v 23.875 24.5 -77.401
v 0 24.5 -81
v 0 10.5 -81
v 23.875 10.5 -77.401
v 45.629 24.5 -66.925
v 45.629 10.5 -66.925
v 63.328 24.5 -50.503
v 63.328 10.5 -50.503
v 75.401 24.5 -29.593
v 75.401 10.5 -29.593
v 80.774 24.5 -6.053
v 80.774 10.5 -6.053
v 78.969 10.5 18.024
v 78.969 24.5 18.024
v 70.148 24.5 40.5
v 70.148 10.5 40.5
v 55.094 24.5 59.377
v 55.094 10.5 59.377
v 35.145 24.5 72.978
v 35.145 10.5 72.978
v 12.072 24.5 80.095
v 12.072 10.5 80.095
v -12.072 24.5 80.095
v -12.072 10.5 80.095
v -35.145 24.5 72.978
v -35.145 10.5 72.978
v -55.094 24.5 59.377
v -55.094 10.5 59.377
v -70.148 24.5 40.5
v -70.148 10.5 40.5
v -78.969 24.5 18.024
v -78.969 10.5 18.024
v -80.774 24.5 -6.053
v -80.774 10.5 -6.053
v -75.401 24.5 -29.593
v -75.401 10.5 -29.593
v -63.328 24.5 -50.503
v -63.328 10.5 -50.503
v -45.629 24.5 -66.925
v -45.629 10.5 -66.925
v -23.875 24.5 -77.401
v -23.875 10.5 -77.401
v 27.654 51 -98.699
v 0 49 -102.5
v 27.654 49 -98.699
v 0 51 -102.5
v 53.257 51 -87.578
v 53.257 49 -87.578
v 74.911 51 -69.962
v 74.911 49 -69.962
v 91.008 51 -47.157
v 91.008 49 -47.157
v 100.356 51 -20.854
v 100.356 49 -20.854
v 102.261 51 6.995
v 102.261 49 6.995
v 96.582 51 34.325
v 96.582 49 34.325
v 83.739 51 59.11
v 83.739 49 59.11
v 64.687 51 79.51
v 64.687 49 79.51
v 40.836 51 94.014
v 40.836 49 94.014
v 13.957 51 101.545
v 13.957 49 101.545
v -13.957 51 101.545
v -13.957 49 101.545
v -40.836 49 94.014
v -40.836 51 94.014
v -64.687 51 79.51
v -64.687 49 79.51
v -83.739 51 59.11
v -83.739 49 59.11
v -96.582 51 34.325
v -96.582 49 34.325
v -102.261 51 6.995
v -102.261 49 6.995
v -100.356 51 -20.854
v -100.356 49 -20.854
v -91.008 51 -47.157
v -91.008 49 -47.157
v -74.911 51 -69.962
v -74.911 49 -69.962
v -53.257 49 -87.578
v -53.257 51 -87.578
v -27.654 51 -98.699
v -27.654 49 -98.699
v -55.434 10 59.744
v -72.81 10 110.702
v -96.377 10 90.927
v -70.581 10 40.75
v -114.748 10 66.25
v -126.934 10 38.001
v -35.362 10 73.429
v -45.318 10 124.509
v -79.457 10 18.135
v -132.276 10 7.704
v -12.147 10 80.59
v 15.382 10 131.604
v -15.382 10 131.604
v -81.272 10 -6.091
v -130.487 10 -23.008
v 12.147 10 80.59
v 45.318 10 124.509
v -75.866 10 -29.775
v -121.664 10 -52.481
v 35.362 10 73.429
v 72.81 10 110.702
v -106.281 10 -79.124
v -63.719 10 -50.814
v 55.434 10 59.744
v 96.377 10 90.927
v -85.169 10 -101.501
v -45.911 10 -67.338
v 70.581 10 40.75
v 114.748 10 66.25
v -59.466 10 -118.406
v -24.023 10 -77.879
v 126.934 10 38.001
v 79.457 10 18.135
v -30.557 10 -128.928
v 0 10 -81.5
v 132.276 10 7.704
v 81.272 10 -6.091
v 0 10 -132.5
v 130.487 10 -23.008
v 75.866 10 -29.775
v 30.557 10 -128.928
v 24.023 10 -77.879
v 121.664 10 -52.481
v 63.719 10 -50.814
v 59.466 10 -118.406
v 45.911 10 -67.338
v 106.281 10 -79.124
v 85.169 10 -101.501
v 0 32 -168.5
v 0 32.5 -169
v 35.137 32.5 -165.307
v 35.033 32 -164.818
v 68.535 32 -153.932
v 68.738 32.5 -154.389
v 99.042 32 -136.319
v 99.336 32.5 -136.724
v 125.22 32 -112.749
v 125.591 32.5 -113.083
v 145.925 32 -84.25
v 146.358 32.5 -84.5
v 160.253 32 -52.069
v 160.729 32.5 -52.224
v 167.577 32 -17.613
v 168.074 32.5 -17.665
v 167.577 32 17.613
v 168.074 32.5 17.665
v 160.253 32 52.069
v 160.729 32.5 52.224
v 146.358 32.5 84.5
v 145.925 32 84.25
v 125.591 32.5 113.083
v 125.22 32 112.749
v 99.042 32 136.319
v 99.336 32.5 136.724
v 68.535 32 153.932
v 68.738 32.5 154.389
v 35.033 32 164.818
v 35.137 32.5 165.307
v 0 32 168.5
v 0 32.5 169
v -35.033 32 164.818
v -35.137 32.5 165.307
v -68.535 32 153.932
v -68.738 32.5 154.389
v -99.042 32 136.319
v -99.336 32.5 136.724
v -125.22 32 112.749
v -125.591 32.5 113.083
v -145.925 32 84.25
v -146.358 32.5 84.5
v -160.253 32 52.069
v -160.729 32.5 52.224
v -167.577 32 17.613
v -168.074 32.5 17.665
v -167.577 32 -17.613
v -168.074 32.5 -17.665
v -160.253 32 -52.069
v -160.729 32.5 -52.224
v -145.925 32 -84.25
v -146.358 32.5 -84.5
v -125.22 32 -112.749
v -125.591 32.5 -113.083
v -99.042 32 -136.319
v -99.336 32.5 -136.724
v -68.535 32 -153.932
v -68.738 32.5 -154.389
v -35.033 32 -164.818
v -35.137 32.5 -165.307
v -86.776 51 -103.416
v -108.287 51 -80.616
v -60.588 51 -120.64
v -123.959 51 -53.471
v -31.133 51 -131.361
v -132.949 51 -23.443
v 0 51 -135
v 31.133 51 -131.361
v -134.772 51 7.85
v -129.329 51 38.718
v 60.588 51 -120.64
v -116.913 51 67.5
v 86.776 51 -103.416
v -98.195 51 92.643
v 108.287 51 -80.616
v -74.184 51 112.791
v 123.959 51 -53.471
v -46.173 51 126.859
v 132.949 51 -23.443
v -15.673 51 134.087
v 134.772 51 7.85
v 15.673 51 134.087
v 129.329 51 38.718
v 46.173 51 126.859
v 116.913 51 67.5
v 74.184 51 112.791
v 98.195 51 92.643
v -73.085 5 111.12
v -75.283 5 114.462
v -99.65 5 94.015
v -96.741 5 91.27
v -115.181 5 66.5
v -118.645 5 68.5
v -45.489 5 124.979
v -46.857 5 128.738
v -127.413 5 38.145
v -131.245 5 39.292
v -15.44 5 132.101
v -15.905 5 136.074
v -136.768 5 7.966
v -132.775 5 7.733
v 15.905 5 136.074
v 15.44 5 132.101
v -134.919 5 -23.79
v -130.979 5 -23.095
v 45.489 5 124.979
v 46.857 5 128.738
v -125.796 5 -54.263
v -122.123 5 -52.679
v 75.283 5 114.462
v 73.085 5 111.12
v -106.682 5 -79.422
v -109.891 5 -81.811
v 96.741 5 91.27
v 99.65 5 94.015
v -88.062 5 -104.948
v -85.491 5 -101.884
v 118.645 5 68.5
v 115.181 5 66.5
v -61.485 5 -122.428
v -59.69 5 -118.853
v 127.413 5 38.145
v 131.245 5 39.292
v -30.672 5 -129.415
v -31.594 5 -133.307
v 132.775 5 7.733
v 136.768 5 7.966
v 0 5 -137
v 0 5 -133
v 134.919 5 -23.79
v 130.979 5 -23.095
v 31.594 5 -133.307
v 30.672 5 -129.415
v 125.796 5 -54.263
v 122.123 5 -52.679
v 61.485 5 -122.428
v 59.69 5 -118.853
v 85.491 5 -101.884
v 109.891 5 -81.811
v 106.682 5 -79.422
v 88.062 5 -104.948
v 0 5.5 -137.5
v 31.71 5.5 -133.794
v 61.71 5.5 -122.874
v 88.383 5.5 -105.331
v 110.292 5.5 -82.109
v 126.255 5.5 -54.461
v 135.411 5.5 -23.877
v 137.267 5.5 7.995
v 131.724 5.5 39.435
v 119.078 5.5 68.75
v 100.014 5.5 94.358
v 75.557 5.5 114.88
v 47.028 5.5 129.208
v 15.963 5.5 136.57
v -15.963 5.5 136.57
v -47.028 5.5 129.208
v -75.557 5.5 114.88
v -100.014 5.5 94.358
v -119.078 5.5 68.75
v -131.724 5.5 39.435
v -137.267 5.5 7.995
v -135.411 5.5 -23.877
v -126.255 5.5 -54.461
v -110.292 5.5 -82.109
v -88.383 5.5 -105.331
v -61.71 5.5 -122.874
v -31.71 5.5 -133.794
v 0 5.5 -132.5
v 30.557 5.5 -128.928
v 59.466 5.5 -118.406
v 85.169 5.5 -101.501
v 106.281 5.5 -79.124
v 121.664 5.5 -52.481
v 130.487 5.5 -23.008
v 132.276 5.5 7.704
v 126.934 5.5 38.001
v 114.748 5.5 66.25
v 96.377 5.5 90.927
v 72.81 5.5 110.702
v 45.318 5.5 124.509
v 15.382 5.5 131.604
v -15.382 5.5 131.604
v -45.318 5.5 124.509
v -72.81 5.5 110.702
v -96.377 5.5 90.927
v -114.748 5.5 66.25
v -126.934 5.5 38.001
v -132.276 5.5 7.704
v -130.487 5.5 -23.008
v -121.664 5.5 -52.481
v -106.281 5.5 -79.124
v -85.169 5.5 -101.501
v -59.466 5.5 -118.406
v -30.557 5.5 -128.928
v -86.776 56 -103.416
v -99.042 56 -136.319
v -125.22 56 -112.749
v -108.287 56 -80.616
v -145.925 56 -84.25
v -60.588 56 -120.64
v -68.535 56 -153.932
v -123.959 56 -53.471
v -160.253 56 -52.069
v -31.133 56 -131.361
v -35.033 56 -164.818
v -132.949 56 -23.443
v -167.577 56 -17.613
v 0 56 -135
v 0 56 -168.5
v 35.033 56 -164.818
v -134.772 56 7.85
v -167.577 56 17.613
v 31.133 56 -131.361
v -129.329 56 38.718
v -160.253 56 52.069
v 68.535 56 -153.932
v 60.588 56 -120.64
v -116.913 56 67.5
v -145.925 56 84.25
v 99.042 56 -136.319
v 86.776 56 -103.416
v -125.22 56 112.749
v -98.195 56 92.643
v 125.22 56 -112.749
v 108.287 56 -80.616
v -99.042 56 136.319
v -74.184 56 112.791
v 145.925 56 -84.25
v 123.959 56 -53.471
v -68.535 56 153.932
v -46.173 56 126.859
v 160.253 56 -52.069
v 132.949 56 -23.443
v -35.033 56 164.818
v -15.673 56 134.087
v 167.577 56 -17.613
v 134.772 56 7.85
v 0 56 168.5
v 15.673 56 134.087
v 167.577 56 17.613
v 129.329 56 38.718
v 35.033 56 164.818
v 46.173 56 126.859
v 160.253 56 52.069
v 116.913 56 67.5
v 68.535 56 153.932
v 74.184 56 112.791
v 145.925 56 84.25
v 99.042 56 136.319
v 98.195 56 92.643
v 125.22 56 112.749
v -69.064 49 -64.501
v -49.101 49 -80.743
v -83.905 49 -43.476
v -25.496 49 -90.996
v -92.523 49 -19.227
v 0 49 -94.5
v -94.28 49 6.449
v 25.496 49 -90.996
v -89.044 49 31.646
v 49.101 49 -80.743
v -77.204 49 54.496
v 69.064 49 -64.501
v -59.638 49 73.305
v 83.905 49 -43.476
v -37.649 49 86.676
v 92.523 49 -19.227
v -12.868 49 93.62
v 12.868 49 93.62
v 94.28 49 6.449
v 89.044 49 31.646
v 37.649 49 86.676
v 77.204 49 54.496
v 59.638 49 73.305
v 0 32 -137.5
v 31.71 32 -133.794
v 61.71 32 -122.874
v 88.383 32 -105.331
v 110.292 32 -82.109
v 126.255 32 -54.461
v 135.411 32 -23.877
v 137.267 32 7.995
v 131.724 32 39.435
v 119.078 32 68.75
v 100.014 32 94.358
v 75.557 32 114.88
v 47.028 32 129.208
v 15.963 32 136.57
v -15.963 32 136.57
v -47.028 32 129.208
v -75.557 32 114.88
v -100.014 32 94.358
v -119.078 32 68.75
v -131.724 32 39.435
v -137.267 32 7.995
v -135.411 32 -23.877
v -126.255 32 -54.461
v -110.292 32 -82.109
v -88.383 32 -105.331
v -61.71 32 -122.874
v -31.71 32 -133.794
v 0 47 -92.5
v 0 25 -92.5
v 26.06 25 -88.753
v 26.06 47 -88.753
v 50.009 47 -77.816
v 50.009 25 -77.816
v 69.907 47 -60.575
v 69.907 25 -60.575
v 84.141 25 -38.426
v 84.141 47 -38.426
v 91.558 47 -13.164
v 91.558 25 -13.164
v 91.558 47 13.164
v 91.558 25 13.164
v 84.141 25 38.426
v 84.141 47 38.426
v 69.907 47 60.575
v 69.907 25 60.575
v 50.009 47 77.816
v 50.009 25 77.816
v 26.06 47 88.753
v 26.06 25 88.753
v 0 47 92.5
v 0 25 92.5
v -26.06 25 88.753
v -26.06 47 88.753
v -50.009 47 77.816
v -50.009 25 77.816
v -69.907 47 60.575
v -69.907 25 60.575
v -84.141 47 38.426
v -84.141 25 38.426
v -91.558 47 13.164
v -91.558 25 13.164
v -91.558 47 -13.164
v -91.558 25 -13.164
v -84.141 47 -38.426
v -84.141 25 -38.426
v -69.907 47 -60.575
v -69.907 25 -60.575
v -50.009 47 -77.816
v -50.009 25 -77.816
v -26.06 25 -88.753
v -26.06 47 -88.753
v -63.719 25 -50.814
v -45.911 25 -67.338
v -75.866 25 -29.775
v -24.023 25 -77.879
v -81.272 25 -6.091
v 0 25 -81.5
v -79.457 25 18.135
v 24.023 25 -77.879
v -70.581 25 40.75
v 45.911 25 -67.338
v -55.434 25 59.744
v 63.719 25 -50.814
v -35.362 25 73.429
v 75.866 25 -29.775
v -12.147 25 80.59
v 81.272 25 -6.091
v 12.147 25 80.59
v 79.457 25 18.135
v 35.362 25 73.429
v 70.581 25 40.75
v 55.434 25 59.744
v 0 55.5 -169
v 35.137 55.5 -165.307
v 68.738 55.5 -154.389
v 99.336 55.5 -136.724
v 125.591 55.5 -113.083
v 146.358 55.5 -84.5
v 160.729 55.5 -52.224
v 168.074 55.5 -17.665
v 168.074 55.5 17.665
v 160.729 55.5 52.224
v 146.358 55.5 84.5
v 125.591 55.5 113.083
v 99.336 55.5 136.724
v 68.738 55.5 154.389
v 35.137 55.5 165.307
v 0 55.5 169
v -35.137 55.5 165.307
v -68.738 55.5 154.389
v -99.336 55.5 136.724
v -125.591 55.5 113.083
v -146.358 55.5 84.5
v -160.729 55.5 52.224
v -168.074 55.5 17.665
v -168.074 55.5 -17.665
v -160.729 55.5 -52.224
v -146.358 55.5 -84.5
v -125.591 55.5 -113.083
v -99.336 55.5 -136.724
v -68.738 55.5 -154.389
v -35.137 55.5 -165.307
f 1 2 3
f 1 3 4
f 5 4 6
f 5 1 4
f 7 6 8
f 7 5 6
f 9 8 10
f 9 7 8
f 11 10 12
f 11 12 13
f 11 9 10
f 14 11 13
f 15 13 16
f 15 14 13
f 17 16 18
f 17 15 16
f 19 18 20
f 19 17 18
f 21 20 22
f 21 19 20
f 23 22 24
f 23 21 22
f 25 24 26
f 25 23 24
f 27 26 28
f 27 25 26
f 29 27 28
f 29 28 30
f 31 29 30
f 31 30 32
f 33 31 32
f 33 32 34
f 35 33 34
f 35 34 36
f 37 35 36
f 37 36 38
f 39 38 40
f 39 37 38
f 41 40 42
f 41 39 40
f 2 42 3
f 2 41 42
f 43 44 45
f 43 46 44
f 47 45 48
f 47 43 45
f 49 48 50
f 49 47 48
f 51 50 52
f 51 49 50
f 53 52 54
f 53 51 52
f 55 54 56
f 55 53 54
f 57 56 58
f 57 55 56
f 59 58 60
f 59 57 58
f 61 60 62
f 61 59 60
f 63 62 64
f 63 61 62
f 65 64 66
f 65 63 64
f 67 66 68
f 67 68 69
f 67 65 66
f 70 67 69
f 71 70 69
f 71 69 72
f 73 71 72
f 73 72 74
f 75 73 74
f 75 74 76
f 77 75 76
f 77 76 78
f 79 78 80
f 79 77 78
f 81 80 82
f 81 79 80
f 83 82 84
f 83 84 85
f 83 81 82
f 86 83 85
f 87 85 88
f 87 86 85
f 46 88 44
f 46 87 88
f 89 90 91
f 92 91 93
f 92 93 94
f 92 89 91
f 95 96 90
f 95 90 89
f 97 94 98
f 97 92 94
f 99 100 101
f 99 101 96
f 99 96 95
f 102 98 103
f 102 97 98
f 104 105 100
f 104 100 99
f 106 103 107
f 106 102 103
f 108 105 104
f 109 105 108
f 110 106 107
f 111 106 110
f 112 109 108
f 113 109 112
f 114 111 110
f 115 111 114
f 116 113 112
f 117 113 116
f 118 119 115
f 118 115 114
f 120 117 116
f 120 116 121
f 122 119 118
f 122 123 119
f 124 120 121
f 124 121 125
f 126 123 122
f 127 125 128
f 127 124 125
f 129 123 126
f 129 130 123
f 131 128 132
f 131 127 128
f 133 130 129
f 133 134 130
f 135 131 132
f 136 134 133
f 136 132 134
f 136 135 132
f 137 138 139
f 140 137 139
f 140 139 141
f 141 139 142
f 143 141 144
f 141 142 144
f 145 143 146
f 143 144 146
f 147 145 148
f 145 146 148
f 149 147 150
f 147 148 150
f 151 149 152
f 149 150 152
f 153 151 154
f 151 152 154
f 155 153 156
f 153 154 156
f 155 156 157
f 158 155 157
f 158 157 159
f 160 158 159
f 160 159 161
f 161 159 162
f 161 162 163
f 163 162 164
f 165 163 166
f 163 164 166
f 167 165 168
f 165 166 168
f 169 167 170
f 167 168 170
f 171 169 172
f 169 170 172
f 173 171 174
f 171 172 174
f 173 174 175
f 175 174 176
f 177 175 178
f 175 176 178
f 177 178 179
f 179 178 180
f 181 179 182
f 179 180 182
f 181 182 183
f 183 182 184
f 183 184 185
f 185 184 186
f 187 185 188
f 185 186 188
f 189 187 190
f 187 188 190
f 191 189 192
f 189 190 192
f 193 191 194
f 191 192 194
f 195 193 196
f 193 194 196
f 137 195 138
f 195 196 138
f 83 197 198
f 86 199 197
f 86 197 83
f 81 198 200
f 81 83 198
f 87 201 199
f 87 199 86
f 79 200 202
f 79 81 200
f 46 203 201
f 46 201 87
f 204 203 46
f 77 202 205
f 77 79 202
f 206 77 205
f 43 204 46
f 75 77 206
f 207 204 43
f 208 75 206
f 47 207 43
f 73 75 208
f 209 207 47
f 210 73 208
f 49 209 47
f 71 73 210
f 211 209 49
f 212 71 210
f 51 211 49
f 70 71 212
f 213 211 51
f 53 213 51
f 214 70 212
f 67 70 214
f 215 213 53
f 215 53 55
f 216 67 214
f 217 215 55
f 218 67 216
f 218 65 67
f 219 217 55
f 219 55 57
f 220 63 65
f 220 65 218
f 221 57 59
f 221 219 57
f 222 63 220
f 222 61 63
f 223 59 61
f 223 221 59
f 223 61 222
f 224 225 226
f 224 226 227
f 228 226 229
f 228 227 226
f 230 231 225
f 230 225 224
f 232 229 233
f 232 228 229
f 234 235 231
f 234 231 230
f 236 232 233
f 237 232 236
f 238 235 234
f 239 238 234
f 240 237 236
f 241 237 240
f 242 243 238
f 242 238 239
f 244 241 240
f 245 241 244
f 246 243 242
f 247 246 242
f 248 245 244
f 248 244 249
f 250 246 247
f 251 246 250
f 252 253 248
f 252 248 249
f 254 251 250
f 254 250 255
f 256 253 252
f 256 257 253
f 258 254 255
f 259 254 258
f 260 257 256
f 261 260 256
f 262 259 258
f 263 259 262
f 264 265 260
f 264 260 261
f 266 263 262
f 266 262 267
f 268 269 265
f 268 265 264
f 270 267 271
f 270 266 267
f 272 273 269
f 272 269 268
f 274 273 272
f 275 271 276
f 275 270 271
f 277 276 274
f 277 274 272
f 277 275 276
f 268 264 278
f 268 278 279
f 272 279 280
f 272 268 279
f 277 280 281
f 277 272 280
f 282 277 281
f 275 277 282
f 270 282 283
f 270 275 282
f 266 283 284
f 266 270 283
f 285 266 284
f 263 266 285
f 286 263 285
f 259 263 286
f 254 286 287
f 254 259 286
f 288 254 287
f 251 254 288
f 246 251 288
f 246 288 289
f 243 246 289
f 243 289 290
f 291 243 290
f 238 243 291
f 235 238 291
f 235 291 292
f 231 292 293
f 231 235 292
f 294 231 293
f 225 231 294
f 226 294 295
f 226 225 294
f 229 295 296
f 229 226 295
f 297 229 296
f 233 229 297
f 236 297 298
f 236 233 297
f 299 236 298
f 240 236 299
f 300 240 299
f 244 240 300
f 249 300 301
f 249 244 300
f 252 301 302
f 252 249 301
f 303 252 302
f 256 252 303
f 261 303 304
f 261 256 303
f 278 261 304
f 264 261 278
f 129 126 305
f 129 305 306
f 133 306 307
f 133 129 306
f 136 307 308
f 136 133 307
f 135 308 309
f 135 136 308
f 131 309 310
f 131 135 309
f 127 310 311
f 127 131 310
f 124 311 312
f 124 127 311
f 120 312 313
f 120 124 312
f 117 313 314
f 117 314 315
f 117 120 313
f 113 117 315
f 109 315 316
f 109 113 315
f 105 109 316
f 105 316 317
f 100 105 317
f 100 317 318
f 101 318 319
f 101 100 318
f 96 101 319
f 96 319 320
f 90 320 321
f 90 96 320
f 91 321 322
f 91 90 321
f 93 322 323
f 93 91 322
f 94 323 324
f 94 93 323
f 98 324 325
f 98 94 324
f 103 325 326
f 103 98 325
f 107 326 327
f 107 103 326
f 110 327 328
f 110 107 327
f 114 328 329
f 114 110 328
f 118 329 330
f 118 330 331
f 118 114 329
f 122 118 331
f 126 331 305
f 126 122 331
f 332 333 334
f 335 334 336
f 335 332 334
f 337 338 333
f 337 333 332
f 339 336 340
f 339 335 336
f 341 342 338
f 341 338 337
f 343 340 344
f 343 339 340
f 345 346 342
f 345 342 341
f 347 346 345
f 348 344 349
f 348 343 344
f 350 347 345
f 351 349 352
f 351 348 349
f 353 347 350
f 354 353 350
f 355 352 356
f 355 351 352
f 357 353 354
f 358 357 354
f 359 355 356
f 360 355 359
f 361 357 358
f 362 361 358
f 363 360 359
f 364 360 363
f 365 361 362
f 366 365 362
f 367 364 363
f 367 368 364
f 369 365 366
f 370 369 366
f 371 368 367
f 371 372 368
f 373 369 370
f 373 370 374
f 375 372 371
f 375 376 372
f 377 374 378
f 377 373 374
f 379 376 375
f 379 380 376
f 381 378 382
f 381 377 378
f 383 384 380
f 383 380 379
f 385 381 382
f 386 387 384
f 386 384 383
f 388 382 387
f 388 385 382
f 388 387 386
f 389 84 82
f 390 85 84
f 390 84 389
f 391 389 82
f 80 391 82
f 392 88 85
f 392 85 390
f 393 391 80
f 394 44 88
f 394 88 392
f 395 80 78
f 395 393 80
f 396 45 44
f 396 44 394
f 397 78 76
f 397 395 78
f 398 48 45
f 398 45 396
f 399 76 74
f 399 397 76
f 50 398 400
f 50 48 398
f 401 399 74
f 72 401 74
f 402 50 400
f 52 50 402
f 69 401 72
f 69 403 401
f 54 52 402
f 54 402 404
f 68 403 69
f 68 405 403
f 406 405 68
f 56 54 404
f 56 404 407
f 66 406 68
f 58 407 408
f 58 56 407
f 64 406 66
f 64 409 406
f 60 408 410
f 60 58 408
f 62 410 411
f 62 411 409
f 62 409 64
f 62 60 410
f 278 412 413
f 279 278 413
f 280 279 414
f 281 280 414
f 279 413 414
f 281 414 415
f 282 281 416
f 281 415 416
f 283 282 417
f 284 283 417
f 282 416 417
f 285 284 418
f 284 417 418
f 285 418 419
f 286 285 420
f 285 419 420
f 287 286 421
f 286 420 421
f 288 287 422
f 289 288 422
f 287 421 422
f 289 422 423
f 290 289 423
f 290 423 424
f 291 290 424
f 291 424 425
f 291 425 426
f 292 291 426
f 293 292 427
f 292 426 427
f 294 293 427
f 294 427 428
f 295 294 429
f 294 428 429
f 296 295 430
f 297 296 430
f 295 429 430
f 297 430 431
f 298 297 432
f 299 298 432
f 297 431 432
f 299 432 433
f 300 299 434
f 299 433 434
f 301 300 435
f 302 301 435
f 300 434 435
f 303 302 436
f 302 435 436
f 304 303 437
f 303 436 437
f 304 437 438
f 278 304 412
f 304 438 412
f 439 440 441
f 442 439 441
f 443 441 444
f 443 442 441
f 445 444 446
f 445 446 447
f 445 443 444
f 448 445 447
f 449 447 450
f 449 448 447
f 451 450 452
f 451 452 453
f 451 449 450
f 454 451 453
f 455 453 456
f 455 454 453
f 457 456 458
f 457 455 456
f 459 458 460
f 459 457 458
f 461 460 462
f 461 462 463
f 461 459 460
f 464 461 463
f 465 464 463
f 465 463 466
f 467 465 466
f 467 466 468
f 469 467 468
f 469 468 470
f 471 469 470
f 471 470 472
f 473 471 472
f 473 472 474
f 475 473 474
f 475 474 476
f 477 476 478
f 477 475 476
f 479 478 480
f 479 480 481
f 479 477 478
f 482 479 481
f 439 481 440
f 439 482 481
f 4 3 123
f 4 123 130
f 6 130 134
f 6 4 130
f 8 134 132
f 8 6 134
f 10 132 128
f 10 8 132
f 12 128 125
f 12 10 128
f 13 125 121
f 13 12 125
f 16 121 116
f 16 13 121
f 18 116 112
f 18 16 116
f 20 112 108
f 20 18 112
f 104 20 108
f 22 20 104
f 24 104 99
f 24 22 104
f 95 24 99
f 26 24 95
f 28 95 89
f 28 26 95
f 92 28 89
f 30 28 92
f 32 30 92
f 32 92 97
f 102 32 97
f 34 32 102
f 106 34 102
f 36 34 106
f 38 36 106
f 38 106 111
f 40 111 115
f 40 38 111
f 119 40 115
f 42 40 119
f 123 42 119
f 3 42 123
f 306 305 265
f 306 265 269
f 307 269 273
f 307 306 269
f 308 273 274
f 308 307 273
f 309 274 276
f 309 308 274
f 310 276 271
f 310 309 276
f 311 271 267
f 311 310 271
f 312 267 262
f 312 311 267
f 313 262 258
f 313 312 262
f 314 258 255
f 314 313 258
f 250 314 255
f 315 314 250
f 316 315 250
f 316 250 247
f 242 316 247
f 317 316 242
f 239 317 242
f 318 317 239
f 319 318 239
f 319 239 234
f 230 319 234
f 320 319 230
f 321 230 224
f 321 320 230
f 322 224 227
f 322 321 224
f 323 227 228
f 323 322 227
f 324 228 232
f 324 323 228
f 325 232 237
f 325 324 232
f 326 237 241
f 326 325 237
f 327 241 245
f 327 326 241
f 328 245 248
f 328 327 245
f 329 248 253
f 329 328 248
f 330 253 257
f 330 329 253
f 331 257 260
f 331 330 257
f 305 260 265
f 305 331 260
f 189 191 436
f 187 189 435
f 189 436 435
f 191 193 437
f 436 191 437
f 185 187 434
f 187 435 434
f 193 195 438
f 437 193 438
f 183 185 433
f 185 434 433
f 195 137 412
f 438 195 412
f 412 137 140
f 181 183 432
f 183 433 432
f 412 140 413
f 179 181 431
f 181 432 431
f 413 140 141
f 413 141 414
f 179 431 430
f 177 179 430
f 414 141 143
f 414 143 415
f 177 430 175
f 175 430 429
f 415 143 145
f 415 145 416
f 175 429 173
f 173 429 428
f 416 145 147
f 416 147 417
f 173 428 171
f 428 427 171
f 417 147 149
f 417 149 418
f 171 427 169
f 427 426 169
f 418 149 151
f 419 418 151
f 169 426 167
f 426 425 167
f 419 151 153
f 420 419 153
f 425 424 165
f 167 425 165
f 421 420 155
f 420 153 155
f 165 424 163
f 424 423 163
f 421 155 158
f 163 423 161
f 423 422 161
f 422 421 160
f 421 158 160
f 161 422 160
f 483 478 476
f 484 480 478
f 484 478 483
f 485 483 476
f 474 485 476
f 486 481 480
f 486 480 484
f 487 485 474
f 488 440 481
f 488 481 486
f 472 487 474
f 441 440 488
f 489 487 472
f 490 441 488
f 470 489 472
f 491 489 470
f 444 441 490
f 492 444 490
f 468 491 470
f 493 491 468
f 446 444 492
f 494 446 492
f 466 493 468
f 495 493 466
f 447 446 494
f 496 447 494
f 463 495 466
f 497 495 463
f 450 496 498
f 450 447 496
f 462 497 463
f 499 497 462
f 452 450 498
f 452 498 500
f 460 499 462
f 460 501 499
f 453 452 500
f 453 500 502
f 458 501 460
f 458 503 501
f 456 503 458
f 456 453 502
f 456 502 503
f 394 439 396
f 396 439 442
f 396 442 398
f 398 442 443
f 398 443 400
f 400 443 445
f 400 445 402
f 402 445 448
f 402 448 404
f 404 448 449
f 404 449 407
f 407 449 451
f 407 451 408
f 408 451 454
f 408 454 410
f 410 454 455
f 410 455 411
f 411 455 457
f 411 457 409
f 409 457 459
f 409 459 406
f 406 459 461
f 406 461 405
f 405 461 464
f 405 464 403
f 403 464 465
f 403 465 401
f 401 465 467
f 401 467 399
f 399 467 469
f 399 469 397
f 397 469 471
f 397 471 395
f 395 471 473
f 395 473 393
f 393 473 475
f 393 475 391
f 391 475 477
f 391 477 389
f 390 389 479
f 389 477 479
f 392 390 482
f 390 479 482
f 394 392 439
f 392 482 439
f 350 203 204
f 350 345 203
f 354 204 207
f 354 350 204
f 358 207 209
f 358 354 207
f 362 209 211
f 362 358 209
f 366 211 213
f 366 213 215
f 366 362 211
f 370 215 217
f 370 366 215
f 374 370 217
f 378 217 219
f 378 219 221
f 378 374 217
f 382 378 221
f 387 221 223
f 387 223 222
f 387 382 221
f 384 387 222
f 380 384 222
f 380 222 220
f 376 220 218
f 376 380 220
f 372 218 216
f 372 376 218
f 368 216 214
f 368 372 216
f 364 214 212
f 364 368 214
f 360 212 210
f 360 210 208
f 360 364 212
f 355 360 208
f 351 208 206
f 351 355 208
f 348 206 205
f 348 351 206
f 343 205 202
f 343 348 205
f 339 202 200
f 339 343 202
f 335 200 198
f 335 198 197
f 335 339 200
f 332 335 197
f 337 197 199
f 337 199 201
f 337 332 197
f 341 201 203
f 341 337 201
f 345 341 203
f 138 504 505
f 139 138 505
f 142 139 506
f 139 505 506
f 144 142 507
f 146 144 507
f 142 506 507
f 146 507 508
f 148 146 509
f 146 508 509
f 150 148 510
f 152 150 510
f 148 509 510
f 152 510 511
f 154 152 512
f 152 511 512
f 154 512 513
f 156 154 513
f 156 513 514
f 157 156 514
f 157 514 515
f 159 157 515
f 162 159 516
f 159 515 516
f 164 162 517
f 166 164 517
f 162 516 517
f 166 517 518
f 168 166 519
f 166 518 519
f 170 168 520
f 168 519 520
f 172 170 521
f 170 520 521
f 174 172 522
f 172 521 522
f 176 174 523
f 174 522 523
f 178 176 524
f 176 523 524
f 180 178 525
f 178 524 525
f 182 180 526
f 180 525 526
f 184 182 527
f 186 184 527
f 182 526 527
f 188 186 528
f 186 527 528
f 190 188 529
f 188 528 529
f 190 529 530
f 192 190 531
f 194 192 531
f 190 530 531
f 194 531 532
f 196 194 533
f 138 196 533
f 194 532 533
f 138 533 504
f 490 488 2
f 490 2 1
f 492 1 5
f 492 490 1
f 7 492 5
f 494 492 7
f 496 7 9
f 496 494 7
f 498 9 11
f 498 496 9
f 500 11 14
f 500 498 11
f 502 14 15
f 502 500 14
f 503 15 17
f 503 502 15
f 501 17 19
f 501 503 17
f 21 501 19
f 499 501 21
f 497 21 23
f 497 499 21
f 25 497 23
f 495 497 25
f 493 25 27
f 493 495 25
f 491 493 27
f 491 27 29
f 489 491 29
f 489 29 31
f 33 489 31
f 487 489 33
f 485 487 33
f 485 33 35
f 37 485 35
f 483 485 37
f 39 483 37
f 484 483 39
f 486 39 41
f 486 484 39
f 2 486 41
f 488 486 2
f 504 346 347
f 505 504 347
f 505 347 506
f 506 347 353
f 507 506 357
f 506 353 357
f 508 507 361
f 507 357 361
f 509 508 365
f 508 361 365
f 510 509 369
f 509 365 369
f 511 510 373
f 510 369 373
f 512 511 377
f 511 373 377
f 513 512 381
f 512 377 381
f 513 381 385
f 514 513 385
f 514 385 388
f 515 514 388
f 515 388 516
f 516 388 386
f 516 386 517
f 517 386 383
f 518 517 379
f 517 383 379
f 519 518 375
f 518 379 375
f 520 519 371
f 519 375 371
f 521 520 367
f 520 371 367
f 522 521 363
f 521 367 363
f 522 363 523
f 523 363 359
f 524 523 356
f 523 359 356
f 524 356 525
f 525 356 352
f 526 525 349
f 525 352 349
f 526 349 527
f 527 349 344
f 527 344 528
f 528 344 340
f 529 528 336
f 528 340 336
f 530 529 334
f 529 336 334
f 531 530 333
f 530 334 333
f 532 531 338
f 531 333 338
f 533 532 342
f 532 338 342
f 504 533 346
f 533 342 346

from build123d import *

# Parameters (mm, degrees)
SKETCH_1_W      = 169
SKETCH_1_H      = 24
SKETCH_2_R      = 137.5
EXTRUDE_1_DEPTH = 27
CHAMFER_1_SIZE  = 0.5
CHAMFER_2_SIZE  = 1.999999998
CHAMFER_2_SIZE2 = 2.000000002


with BuildPart() as part:
    # 草圖1 → 旋轉1 (revolve)
    with BuildSketch(Plane.XY, mode=Mode.PRIVATE) as revolve_1_sk:
        with Locations((84.5, 44)):
            Rectangle(SKETCH_1_W, SKETCH_1_H)
    revolve(revolve_1_sk.sketch.rotate(Axis((0, 56, 0), (0, -1, 0)), 270), axis=Axis((0, 56, 0), (0, -1, 0)))

    # 草圖2 → 填料-伸長1 (add)
    with BuildSketch(Plane.XZ.offset(-32)):
        with Locations(Location((0, 0, 0), (0, 0, 270))):
            Circle(SKETCH_2_R)
    extrude(amount=EXTRUDE_1_DEPTH)

    # 草圖3 → 除料-旋轉1 (revolve, cut)
    with BuildSketch(Plane.XY, mode=Mode.PRIVATE) as cut_revolve_1_sk:
        Polygon((135, 56), (0, 56), (0, 5), (132.5, 5), (132.5, 10), (81, 10), (81, 25), (92.5, 25), (92.5, 49), (102.5, 49), (102.5, 51), (135, 51), align=None)
    revolve(cut_revolve_1_sk.sketch.rotate(Axis((0, 56, 0), (0, -1, 0)), 270), axis=Axis((0, 56, 0), (0, -1, 0)), mode=Mode.SUBTRACT)

    # 導角1
    chamfer_1_edges = [part.edges().sort_by_distance(p)[0] for p in [
        (0, 5, 137.5),
        (0, 5, 132.5),
        (0, 10, 81),
        (0, 25, 81),
        (0, 32, 169),
        (0, 56, 169),
    ]]
    chamfer(chamfer_1_edges, length=CHAMFER_1_SIZE)

    # 導角2
    chamfer_2_edges = [part.edges().sort_by_distance(p)[0] for p in [
        (0, 49, 92.5),
    ]]
    chamfer_2_side = [part.faces().sort_by_distance(p)[0] for p in [
        (0, 49, 95.399137803),
    ]]
    chamfer(chamfer_2_edges, length=CHAMFER_2_SIZE, length2=CHAMFER_2_SIZE2, reference=chamfer_2_side[0])


solid = part.part
